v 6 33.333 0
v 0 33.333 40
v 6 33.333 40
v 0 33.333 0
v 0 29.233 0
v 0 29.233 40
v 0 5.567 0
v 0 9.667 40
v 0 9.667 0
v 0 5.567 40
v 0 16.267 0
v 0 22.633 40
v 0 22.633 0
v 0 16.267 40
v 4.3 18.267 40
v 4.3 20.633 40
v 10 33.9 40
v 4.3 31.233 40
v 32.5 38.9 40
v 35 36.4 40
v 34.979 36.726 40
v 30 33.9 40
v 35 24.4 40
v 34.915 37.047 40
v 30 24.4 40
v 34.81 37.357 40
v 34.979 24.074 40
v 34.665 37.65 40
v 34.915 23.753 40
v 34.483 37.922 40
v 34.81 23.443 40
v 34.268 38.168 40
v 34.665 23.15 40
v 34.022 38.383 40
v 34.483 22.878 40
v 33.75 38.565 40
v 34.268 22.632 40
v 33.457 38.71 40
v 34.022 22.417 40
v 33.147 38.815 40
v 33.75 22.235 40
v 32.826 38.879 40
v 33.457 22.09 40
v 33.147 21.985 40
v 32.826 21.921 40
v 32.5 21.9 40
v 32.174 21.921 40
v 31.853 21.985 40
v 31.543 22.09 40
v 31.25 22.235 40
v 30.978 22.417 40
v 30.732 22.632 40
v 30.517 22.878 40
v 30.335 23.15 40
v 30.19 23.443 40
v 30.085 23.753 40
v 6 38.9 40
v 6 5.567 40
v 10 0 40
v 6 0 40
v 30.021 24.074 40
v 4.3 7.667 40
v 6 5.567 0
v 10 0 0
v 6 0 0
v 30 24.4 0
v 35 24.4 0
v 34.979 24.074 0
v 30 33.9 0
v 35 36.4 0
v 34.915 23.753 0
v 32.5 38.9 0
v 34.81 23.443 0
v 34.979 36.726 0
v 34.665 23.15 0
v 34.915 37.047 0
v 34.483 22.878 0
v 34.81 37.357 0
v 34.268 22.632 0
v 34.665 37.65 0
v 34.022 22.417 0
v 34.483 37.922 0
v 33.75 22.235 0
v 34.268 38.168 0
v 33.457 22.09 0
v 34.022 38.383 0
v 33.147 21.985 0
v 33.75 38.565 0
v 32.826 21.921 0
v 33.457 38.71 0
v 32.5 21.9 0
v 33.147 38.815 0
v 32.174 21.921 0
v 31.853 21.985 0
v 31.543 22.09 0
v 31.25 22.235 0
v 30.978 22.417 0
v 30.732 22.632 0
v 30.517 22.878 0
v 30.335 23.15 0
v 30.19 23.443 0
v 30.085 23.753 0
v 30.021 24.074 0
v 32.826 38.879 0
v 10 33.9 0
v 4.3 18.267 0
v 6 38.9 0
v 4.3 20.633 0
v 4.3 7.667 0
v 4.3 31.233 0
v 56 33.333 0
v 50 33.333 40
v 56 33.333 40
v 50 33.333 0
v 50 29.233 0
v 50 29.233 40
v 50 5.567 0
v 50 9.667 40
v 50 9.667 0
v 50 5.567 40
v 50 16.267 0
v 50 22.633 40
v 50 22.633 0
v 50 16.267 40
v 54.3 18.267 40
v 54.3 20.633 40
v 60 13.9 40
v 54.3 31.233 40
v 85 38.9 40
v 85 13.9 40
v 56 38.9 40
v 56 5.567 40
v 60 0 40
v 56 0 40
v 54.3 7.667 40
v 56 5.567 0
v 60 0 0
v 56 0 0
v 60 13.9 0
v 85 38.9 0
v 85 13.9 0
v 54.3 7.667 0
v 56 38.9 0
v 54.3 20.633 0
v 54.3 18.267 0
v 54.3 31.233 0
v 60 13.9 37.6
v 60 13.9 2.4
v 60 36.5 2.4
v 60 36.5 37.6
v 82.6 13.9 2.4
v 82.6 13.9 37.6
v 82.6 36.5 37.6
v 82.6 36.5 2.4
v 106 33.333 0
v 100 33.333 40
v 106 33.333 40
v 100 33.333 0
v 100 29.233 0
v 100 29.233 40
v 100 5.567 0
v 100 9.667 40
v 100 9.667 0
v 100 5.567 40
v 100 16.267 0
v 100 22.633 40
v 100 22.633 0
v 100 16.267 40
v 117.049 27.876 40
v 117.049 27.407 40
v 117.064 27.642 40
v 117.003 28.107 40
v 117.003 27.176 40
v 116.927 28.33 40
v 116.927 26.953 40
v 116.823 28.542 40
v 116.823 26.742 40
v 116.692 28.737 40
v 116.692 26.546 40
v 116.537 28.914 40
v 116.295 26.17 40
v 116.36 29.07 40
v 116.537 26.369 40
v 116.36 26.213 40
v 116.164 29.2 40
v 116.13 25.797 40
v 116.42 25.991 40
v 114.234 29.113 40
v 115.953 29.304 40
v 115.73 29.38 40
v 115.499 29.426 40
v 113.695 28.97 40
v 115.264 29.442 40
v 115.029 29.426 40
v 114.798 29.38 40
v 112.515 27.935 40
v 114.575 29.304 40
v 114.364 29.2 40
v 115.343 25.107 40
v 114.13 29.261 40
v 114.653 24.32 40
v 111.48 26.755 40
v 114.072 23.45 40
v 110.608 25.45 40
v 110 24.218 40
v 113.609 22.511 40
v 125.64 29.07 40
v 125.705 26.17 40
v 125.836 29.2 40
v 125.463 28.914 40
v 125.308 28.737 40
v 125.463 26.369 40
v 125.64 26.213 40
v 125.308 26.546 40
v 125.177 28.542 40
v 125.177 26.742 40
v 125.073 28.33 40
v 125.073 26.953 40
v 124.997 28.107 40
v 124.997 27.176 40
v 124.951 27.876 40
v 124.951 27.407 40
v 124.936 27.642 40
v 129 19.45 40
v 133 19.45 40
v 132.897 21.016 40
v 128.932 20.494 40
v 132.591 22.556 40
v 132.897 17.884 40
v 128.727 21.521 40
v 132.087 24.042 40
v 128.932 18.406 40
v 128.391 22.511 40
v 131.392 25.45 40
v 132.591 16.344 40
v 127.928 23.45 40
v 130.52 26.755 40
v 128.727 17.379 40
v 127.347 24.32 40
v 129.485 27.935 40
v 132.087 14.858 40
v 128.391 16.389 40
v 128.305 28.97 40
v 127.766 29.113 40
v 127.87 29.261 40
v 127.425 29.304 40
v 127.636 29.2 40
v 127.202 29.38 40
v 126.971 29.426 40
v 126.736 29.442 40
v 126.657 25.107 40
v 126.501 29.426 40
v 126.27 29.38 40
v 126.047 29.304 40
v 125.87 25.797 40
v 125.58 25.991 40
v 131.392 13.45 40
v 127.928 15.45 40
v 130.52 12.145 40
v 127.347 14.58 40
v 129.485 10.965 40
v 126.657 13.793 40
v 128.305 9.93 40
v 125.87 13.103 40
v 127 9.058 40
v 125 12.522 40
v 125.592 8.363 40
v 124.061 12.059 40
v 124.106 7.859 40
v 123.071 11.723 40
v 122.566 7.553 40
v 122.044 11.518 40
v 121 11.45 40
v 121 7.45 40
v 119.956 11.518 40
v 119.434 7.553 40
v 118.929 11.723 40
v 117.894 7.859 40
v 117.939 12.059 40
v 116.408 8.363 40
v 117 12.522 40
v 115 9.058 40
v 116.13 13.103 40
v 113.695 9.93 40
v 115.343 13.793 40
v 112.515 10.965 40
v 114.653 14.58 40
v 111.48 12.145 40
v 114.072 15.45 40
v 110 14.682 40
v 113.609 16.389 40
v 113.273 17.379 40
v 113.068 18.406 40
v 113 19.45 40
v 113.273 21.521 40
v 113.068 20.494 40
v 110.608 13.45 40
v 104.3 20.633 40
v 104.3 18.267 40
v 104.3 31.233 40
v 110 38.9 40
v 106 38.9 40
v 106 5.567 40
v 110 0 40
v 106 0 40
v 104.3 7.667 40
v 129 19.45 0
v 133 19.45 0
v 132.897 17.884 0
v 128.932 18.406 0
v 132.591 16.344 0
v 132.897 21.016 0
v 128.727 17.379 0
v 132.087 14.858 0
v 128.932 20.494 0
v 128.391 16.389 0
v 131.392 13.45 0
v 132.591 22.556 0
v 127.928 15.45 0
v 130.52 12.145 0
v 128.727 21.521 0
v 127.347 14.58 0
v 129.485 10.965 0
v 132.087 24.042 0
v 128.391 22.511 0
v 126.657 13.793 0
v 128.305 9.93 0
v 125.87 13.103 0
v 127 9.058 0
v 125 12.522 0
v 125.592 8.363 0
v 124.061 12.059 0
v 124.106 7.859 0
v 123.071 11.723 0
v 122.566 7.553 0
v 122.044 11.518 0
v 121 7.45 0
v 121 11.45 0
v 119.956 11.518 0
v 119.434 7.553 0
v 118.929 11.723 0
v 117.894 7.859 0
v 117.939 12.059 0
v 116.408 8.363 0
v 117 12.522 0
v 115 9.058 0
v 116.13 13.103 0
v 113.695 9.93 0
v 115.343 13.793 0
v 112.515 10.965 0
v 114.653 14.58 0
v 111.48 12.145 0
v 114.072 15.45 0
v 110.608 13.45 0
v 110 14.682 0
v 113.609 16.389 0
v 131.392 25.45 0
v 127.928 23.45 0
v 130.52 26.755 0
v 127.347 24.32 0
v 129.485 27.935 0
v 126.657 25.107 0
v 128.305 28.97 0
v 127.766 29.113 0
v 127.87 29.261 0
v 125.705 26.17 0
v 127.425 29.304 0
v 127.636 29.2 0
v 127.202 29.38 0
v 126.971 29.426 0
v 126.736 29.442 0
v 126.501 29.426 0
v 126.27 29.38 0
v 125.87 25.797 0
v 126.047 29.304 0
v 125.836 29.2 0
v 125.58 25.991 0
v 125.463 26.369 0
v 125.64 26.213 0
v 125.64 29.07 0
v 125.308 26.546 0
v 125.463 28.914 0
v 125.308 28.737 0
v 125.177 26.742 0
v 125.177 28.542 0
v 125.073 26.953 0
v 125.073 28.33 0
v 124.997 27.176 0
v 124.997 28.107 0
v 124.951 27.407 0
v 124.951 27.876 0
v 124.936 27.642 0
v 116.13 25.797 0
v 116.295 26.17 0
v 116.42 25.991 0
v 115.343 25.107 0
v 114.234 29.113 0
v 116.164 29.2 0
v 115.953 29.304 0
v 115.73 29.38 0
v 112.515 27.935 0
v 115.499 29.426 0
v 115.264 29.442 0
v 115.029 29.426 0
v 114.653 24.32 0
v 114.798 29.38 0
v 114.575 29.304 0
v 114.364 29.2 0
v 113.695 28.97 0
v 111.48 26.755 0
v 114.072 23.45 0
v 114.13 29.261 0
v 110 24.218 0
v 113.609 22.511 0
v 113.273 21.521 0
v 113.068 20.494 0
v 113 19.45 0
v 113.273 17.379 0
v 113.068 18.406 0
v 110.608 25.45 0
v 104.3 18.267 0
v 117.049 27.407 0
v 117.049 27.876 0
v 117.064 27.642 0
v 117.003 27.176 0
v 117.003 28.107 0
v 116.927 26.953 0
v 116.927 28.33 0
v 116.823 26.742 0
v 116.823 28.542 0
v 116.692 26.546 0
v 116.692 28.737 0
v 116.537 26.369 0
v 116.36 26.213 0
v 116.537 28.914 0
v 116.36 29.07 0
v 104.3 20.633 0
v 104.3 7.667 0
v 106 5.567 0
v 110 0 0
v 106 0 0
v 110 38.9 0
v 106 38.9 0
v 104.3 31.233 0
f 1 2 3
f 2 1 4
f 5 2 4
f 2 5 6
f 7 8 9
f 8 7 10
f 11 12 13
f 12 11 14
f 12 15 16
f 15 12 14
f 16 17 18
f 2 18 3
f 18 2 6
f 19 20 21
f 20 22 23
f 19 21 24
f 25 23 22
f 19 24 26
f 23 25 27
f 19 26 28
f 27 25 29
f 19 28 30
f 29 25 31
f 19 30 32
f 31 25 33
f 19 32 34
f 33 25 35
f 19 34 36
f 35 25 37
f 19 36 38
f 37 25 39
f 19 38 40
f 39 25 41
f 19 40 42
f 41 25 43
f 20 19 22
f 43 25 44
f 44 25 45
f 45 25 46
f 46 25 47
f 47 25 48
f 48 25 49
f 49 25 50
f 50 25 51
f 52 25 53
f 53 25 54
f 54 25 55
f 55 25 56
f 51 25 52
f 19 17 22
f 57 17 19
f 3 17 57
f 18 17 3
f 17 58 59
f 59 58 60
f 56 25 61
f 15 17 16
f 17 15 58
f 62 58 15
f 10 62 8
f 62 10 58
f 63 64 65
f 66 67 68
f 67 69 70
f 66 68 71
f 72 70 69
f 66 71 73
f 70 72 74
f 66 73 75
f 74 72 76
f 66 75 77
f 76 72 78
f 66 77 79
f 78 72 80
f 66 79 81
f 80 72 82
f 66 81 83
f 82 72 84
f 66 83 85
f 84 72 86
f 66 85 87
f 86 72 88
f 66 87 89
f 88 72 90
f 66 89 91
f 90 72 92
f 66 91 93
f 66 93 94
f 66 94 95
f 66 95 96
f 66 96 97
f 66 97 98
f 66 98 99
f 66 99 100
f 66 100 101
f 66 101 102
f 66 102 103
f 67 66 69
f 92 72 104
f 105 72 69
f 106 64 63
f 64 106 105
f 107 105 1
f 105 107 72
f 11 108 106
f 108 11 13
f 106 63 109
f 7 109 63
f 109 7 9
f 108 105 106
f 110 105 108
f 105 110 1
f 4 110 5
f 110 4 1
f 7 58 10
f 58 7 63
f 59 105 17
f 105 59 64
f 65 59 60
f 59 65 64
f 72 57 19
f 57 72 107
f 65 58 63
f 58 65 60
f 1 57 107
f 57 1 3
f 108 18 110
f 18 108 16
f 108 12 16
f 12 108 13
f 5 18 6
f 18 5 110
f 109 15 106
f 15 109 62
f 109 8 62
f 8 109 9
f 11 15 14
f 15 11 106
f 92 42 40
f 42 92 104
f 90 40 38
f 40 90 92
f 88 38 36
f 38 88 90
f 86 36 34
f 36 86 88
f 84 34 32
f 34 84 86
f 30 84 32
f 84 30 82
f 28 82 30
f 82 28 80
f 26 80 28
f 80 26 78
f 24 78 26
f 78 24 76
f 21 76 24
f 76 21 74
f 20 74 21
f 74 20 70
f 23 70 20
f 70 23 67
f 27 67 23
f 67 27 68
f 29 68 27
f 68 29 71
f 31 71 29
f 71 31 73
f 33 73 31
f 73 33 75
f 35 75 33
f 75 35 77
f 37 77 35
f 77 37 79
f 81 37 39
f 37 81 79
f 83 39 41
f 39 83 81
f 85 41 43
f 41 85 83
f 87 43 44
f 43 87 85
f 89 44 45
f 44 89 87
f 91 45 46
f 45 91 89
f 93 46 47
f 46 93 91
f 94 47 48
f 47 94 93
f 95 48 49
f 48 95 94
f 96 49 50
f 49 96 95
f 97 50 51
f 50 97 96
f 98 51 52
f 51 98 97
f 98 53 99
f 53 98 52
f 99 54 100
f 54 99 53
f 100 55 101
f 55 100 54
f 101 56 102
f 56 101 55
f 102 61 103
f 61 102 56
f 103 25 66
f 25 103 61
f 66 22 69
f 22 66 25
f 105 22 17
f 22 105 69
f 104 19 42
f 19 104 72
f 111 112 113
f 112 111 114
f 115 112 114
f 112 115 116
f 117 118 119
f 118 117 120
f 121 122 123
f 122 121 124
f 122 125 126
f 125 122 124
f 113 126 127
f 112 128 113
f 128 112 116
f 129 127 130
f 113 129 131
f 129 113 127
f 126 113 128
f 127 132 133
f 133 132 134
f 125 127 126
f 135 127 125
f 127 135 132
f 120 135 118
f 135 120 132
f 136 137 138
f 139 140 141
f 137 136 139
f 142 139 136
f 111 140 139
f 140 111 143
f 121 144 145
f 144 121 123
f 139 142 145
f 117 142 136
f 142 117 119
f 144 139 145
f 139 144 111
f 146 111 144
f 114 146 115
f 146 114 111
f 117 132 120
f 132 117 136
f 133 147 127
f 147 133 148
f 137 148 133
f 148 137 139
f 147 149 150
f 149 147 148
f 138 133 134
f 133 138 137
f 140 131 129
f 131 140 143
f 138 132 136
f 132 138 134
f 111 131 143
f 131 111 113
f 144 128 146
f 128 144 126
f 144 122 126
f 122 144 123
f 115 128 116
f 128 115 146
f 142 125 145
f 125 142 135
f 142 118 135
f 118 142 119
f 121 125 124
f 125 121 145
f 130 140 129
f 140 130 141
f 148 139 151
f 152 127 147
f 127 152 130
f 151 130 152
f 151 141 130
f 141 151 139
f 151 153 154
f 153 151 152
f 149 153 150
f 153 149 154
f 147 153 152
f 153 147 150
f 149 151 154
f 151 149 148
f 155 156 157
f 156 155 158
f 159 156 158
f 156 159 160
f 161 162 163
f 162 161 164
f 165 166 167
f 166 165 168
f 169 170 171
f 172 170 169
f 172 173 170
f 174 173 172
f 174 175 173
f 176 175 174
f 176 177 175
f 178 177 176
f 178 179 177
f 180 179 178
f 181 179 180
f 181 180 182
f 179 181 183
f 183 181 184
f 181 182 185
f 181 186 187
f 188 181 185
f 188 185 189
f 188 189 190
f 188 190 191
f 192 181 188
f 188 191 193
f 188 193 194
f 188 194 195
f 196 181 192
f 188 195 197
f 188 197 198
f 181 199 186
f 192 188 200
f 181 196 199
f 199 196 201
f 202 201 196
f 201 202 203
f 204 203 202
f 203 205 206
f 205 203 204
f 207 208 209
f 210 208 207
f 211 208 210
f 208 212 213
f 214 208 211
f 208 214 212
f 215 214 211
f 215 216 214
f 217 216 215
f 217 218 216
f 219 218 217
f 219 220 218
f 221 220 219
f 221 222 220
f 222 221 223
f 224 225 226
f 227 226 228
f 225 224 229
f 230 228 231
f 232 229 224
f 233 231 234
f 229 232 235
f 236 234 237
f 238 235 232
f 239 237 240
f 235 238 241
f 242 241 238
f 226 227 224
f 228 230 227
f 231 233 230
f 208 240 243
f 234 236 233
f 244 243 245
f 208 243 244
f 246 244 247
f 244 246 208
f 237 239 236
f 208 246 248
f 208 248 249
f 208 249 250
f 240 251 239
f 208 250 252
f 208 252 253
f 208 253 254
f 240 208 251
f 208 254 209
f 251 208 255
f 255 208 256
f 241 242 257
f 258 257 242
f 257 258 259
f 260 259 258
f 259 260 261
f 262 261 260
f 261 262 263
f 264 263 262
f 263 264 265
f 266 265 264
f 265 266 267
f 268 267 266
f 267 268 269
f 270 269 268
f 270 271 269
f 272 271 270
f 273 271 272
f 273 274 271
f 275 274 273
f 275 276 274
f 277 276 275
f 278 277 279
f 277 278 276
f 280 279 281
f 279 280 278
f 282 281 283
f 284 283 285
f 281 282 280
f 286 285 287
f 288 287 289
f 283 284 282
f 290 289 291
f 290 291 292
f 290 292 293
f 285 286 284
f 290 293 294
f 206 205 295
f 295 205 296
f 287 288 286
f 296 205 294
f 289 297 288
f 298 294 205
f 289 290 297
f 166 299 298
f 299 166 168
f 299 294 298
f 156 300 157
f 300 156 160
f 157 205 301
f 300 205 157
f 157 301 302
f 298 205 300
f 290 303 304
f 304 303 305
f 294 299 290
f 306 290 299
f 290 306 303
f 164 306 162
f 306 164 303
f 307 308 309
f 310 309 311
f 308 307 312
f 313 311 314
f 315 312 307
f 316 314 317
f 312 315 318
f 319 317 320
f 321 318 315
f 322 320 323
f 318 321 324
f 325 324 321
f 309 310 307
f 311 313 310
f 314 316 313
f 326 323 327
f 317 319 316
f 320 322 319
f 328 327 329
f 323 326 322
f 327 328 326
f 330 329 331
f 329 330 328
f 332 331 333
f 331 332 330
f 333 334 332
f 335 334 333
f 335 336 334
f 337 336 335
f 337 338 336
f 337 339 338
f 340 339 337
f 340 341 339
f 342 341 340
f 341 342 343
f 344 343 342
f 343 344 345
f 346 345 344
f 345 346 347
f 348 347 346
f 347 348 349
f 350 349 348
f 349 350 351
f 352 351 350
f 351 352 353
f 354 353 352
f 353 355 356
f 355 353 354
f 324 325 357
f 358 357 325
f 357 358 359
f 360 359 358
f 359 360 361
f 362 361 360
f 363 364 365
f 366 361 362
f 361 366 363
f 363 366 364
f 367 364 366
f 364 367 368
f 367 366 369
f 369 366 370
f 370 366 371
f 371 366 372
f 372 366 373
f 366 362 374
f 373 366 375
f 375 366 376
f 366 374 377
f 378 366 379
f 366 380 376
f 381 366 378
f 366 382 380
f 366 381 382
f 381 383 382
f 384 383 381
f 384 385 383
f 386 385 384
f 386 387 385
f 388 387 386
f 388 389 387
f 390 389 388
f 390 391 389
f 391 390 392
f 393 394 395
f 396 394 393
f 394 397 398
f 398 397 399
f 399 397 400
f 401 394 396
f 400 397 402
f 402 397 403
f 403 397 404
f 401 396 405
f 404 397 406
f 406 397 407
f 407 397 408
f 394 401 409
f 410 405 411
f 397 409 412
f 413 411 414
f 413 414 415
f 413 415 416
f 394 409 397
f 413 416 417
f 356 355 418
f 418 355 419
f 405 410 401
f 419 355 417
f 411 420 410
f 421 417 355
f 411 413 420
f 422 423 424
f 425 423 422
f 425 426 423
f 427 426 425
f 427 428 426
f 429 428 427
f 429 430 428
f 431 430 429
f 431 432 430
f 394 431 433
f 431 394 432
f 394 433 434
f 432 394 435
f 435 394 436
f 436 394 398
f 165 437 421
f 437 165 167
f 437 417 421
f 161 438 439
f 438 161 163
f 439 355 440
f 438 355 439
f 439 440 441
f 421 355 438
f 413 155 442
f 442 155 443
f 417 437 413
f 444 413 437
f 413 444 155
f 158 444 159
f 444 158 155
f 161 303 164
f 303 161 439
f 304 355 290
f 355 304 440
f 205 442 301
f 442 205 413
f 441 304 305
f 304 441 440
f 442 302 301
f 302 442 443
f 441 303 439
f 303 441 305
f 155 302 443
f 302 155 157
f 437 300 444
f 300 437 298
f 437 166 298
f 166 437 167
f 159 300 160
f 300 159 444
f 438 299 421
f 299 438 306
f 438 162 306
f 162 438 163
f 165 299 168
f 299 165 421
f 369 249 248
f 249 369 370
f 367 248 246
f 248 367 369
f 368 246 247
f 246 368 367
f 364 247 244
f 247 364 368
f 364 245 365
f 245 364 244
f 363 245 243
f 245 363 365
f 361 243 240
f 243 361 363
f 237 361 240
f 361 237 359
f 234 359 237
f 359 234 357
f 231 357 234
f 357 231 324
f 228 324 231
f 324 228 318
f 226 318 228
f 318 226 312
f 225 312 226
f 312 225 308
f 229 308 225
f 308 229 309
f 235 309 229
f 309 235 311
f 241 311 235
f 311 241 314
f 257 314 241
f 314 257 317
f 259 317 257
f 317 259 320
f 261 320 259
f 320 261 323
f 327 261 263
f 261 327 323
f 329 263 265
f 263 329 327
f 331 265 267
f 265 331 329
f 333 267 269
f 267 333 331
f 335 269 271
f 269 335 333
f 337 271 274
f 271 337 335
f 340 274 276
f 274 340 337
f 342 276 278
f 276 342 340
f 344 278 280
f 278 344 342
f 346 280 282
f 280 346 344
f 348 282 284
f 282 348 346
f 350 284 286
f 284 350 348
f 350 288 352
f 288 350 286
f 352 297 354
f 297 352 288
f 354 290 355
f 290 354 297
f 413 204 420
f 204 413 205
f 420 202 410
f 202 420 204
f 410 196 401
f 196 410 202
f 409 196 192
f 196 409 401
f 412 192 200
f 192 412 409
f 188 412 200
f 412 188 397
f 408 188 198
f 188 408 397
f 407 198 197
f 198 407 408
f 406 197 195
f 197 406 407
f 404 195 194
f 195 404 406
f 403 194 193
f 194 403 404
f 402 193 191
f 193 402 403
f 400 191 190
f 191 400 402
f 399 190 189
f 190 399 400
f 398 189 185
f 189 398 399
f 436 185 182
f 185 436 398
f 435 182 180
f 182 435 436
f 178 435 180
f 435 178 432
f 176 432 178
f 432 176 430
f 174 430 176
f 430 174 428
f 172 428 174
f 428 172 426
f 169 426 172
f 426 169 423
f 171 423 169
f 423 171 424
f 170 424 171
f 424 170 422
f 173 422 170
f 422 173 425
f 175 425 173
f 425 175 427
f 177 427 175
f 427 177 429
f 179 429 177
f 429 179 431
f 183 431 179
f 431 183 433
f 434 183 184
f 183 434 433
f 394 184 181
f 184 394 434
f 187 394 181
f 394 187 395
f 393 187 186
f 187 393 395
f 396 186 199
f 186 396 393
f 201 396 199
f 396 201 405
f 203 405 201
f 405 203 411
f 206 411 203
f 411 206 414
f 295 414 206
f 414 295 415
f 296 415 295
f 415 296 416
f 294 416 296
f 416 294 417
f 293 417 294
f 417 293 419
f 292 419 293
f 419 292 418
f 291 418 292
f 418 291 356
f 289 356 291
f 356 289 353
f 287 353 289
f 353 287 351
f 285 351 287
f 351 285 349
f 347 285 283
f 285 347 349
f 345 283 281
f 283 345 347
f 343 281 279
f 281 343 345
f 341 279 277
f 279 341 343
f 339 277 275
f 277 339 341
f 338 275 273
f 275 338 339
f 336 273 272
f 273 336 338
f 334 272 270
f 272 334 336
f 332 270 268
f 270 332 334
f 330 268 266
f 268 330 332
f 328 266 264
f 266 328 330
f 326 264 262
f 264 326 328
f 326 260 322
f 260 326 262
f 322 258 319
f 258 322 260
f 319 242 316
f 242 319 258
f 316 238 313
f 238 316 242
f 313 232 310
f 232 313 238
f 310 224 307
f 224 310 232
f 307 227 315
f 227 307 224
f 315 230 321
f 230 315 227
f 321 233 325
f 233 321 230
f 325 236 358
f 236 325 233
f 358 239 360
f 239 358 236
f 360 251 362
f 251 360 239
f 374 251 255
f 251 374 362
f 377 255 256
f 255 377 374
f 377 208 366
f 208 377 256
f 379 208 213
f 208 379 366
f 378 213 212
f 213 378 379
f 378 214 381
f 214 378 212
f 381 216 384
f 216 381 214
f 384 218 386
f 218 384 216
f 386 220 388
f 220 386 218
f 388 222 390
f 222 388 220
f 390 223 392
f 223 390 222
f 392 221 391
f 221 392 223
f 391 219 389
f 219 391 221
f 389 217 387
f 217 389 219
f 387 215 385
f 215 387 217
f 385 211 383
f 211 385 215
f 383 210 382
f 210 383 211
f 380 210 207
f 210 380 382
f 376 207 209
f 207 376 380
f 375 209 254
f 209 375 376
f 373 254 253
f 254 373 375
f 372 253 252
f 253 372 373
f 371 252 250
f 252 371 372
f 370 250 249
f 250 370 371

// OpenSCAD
// @name Desk Rail Accessories
// @description Under-desk accessories - headphone hook, pen tray and cable catch - that slide onto the dovetail rails of the Gridfinity Under-Desk Drawer housing.
// @tags desk, accessories, dovetail, gridfinity, organization
//
// A family of accessories for the Gridfinity Under-Desk Drawer
// (gridfinity_drawer.scad). Each accessory is a vertical mount plate
// carrying female dovetail channels that slide onto the housing's
// RIGHT-side rails, plus a functional feature on the outboard face:
//
//   headphone_hook : wide J-hook (rounded, ~20mm throat) - hang a
//                    headset under the desk
//   pen_tray       : small open-top tray for pens / small parts
//   cable_catch    : open C-profile clip - press a cable bundle up
//                    through the bottom gap
//
// Interface: the "Drawer Housing Interface" parameters MUST match the
// housing they mount on. The defaults here match gridfinity_drawer.scad
// at ITS defaults:
//   rail_mount_height 38.9 = rail_height 4 + drawer 31.6 + clearance 0.3
//                            + top_plate 3   (the housing _housing_z)
//   rail centers at rail_mount_height*(i+1)/(rail_count+1)
//                 = 12.967 / 25.933 mm for 2 rails
//   dovetail 6mm at the wall, 10mm at the tip, 4mm deep, 0.3 clearance
//   housing_outer_width 134.6 = 3*42 + 2*2 + 2*0.3 + 2*2 (mounted view
//                               and fit tests only)
//
// Assembly: slide the accessory onto the housing's right-side rails
// from the housing front, exactly like chaining a second housing.
// The wide-at-the-tip trapezoid locks the pull-apart (x) direction;
// the channel walls lock z.
//
// Printing ("all" mode): every accessory prints STANDING ON ITS FRONT
// (y=0) FACE, exactly like the housing prints. Justification: the
// mount plate + dovetail-channel cross-section is constant along y, so
// the channels print as vertical features (dimensionally accurate, no
// support), and the hook and catch profiles are pure prisms with zero
// overhangs. The pen tray's far end wall prints as a short horizontal
// bridge (~tray_depth wide) anchored on three sides by the plate,
// floor and outer wall - prints support-free. Nothing else overhangs.

// Imported for the "mounted" preview (housing()); `use` brings in
// modules/functions only and renders nothing.
use <gridfinity_drawer.scad>

/* [Headphone Hook] */
// Hook throat: clear horizontal gap between plate face and tip (mm)
hook_depth = 20; // [12:2:40]

// Hook arm/tip bar thickness (mm)
hook_thickness = 5; // [4:1:8]

// Height of the upturned tip above the arm (mm)
hook_tip_height = 12; // [6:2:20]

/* [Pen Tray] */
// Tray outer depth away from the plate (mm)
tray_depth = 25; // [15:5:45]

// Tray outer height (mm)
tray_height = 25; // [15:5:40]

/* [Cable Catch] */
// Inner diameter of the C-catch - size of the cable bundle (mm)
catch_dia = 16; // [8:2:26]

/* [Mount Plate] */
// Plate length along the rails (mm)
plate_length = 40; // [30:5:80]

// Backplate thickness (mm)
plate_thickness = 4.0;

/* [Drawer Housing Interface] */
// Housing height = rail mount span (mm) - gridfinity_drawer _housing_z
rail_mount_height = 38.9;

// Number of dovetail rails (must match the housing's dovetail_count)
rail_count = 2; // [1:1:5]

// Dovetail rail width at the wall (mm) - match housing dovetail_narrow
dovetail_narrow = 6.0;

// Dovetail rail width at the tip (mm) - match housing dovetail_wide
dovetail_wide = 10.0;

// Dovetail rail protrusion depth (mm) - match housing dovetail_depth
dovetail_depth = 4.0;

// Sliding clearance around the rail (mm) - match housing clearance
clearance = 0.3;

// Housing outer width at its defaults (mm) - mounted view / fit tests
housing_outer_width = 134.6;

/* [Display] */
// What to show
_display_mode = "all"; // ["all", "hook", "pen_tray", "cable_catch", "mounted"]

/* [Advanced] */
// Resolution
$fn = 48;

// Catch ring wall thickness (mm)
catch_wall = 4.0; // [3:1:6]

// ---- Derived dimensions ----

// Female boss depth: channel + backing material (same as the housing)
_boss_d = dovetail_depth + 2;

// Boss slab height per rail (same 2.4mm margin as the housing bosses)
_boss_h = dovetail_wide + 4.8;

// Plate spans the full housing height
_plate_h = rail_mount_height;

// Tray wall/floor thickness
_tray_wall = 2.4;

// Cable catch opening half-angle (about straight down)
_catch_gap = 35;

// Rail center heights - same formula as the housing's dovetail_z()
function rail_z(i) = rail_mount_height * (i + 1) / (rail_count + 1);

// Assembled position of an accessory on the housing (housing frame):
// its boss face sits against the housing's right wall, y = slide
// position along the rails. Used by the mounted view and fit tests.
function rail_mount_offset(y = 0) = [housing_outer_width + _boss_d, y, 0];

// ---- Envelope asserts ----

assert(dovetail_wide > dovetail_narrow,
    "Dovetail must be wider at the tip than at the wall or it cannot lock");

assert(rail_mount_height / (rail_count + 1) > dovetail_wide / 2 + clearance,
    str("Rails too close together: ", rail_count, " rails need spacing > ",
        dovetail_wide / 2 + clearance, "mm; got ",
        rail_mount_height / (rail_count + 1), "mm"));

assert(hook_thickness + hook_tip_height <= rail_mount_height - 2,
    str("Hook tip reaches z=", hook_thickness + hook_tip_height,
        " and would hit the desk (limit ", rail_mount_height - 2, ")"));

assert(catch_dia / 2 + catch_wall <= _plate_h / 2,
    str("Cable catch outer radius ", catch_dia / 2 + catch_wall,
        " does not fit on a ", _plate_h, "mm plate"));

assert(tray_depth > _tray_wall + 5 && tray_height > _tray_wall + 5,
    "Pen tray too small to have a cavity");

// ---- Modules ----

// Extrude a 2D profile (drawn in the x-z plane: 2D y maps to +z)
// along +y from y=0 to y=length.
module y_prism(length) {
    translate([0, length, 0])
        rotate([90, 0, 0])
            linear_extrude(height = length)
                children();
}

// === MOUNT PLATE ===
// Origin: plate back face (housing side) at x=0, front face at y=0,
// bottom at z=0. Bosses protrude to x=-_boss_d; the dovetail channels
// (oversized by the clearance, same as the housing's own left-side
// channels) open toward -x and run the full length in y.
module mount_plate() {
    difference() {
        union() {
            // Backplate
            cube([plate_thickness, plate_length, _plate_h]);

            // Female bosses, one band per rail (clamped to the plate;
            // adjacent bands merge when rails are close together)
            for (i = [0 : rail_count - 1]) {
                z0 = max(0, rail_z(i) - _boss_h / 2);
                z1 = min(_plate_h, rail_z(i) + _boss_h / 2);
                translate([-_boss_d, 0, z0])
                    cube([_boss_d + 0.05, plate_length, z1 - z0]);
            }
        }

        // Dovetail channels, oversized by the clearance so the rail
        // slides in from the front (geometry copied from the housing)
        for (i = [0 : rail_count - 1])
            translate([-_boss_d, -0.5, rail_z(i)])
                dovetail_rail(dovetail_narrow + clearance * 2,
                              dovetail_wide + clearance * 2,
                              dovetail_depth + clearance,
                              plate_length + 1);
    }
}

// 2D J-hook profile in the x-z plane: horizontal arm out of the plate
// at the bottom, rounded upturned tip. Throat = hook_depth.
module hook_profile() {
    r = hook_thickness / 2;
    tip_cx = plate_thickness + hook_depth + r;
    // Arm (sunk 1mm into the plate to weld)
    hull() {
        translate([plate_thickness - 1, r]) circle(r = r);
        translate([tip_cx, r]) circle(r = r);
    }
    // Upturned tip
    hull() {
        translate([tip_cx, r]) circle(r = r);
        translate([tip_cx, r + hook_tip_height]) circle(r = r);
    }
}

// 2D open-C profile in the x-z plane, opening facing straight down so
// a cable bundle pushes up past the rounded lips and is retained.
module catch_profile() {
    inner_r = catch_dia / 2;
    outer_r = inner_r + catch_wall;
    cx = plate_thickness + outer_r - 1;  // ring sunk 1mm into the plate
    cz = _plate_h / 2;
    mid_r = (inner_r + outer_r) / 2;
    lip_r = catch_wall / 2 - 0.2;        // inset: no tangent contact
    big = outer_r + 5;

    translate([cx, cz]) {
        difference() {
            circle(r = outer_r);
            circle(r = inner_r);
            // Opening wedge, centered straight down
            polygon([[0, 0],
                     [-big * sin(_catch_gap), -big * cos(_catch_gap)],
                     [ big * sin(_catch_gap), -big * cos(_catch_gap)]]);
        }
        // Rounded lips on the cut ends
        for (s = [-1, 1])
            translate([s * mid_r * sin(_catch_gap), -mid_r * cos(_catch_gap)])
                circle(r = lip_r);
    }
}

// === ACCESSORIES ===
// Each is mount_plate() plus its feature, welded as one body.

module headphone_hook() {
    mount_plate();
    y_prism(plate_length) hook_profile();
}

module pen_tray() {
    mount_plate();
    difference() {
        // Tray shell, overlapped 0.5mm into the plate to weld; the
        // plate itself is the tray's back wall
        translate([plate_thickness - 0.5, 0, 0])
            cube([tray_depth + 0.5, plate_length, tray_height]);
        // Cavity: opens through the top (cutter overshoots the rim)
        translate([plate_thickness, _tray_wall, _tray_wall])
            cube([tray_depth - _tray_wall,
                  plate_length - 2 * _tray_wall,
                  tray_height]);
    }
}

module cable_catch() {
    mount_plate();
    y_prism(plate_length) catch_profile();
}

// ---- Layout helpers ----

// Overall x footprint of each accessory (from boss tip to feature tip)
function w_hook()  = _boss_d + plate_thickness + hook_depth + hook_thickness;
function w_tray()  = _boss_d + plate_thickness + tray_depth;
function w_catch() = _boss_d + plate_thickness + catch_dia + 2 * catch_wall - 1;

// === DISPLAY ===

// Print layout: all three accessories standing on their front (y=0)
// face - the same orientation the housing prints in. See header.
module layout_all() {
    gap = 15;
    x_hook  = 0;
    x_tray  = x_hook + w_hook() + gap;
    x_catch = x_tray + w_tray() + gap;

    color("Coral")
        translate([x_hook + _boss_d, _plate_h, 0])
            rotate([90, 0, 0]) headphone_hook();
    color("MediumSeaGreen")
        translate([x_tray + _boss_d, _plate_h, 0])
            rotate([90, 0, 0]) pen_tray();
    color("SteelBlue")
        translate([x_catch + _boss_d, _plate_h, 0])
            rotate([90, 0, 0]) cable_catch();
}

// Mounted view: headphone hook on the actual drawer housing's
// right-side rails (housing at gridfinity_drawer defaults)
module show_mounted() {
    eps = 0.05;  // keep touching faces apart in the exported mesh
    color("SlateGray", 0.6)
        housing();
    color("Coral")
        translate(rail_mount_offset(20) + [eps, 0, 0])
            headphone_hook();
}

if (_display_mode == "all") {
    layout_all();
} else if (_display_mode == "hook") {
    headphone_hook();
} else if (_display_mode == "pen_tray") {
    pen_tray();
} else if (_display_mode == "cable_catch") {
    cable_catch();
} else if (_display_mode == "mounted") {
    show_mounted();
}
